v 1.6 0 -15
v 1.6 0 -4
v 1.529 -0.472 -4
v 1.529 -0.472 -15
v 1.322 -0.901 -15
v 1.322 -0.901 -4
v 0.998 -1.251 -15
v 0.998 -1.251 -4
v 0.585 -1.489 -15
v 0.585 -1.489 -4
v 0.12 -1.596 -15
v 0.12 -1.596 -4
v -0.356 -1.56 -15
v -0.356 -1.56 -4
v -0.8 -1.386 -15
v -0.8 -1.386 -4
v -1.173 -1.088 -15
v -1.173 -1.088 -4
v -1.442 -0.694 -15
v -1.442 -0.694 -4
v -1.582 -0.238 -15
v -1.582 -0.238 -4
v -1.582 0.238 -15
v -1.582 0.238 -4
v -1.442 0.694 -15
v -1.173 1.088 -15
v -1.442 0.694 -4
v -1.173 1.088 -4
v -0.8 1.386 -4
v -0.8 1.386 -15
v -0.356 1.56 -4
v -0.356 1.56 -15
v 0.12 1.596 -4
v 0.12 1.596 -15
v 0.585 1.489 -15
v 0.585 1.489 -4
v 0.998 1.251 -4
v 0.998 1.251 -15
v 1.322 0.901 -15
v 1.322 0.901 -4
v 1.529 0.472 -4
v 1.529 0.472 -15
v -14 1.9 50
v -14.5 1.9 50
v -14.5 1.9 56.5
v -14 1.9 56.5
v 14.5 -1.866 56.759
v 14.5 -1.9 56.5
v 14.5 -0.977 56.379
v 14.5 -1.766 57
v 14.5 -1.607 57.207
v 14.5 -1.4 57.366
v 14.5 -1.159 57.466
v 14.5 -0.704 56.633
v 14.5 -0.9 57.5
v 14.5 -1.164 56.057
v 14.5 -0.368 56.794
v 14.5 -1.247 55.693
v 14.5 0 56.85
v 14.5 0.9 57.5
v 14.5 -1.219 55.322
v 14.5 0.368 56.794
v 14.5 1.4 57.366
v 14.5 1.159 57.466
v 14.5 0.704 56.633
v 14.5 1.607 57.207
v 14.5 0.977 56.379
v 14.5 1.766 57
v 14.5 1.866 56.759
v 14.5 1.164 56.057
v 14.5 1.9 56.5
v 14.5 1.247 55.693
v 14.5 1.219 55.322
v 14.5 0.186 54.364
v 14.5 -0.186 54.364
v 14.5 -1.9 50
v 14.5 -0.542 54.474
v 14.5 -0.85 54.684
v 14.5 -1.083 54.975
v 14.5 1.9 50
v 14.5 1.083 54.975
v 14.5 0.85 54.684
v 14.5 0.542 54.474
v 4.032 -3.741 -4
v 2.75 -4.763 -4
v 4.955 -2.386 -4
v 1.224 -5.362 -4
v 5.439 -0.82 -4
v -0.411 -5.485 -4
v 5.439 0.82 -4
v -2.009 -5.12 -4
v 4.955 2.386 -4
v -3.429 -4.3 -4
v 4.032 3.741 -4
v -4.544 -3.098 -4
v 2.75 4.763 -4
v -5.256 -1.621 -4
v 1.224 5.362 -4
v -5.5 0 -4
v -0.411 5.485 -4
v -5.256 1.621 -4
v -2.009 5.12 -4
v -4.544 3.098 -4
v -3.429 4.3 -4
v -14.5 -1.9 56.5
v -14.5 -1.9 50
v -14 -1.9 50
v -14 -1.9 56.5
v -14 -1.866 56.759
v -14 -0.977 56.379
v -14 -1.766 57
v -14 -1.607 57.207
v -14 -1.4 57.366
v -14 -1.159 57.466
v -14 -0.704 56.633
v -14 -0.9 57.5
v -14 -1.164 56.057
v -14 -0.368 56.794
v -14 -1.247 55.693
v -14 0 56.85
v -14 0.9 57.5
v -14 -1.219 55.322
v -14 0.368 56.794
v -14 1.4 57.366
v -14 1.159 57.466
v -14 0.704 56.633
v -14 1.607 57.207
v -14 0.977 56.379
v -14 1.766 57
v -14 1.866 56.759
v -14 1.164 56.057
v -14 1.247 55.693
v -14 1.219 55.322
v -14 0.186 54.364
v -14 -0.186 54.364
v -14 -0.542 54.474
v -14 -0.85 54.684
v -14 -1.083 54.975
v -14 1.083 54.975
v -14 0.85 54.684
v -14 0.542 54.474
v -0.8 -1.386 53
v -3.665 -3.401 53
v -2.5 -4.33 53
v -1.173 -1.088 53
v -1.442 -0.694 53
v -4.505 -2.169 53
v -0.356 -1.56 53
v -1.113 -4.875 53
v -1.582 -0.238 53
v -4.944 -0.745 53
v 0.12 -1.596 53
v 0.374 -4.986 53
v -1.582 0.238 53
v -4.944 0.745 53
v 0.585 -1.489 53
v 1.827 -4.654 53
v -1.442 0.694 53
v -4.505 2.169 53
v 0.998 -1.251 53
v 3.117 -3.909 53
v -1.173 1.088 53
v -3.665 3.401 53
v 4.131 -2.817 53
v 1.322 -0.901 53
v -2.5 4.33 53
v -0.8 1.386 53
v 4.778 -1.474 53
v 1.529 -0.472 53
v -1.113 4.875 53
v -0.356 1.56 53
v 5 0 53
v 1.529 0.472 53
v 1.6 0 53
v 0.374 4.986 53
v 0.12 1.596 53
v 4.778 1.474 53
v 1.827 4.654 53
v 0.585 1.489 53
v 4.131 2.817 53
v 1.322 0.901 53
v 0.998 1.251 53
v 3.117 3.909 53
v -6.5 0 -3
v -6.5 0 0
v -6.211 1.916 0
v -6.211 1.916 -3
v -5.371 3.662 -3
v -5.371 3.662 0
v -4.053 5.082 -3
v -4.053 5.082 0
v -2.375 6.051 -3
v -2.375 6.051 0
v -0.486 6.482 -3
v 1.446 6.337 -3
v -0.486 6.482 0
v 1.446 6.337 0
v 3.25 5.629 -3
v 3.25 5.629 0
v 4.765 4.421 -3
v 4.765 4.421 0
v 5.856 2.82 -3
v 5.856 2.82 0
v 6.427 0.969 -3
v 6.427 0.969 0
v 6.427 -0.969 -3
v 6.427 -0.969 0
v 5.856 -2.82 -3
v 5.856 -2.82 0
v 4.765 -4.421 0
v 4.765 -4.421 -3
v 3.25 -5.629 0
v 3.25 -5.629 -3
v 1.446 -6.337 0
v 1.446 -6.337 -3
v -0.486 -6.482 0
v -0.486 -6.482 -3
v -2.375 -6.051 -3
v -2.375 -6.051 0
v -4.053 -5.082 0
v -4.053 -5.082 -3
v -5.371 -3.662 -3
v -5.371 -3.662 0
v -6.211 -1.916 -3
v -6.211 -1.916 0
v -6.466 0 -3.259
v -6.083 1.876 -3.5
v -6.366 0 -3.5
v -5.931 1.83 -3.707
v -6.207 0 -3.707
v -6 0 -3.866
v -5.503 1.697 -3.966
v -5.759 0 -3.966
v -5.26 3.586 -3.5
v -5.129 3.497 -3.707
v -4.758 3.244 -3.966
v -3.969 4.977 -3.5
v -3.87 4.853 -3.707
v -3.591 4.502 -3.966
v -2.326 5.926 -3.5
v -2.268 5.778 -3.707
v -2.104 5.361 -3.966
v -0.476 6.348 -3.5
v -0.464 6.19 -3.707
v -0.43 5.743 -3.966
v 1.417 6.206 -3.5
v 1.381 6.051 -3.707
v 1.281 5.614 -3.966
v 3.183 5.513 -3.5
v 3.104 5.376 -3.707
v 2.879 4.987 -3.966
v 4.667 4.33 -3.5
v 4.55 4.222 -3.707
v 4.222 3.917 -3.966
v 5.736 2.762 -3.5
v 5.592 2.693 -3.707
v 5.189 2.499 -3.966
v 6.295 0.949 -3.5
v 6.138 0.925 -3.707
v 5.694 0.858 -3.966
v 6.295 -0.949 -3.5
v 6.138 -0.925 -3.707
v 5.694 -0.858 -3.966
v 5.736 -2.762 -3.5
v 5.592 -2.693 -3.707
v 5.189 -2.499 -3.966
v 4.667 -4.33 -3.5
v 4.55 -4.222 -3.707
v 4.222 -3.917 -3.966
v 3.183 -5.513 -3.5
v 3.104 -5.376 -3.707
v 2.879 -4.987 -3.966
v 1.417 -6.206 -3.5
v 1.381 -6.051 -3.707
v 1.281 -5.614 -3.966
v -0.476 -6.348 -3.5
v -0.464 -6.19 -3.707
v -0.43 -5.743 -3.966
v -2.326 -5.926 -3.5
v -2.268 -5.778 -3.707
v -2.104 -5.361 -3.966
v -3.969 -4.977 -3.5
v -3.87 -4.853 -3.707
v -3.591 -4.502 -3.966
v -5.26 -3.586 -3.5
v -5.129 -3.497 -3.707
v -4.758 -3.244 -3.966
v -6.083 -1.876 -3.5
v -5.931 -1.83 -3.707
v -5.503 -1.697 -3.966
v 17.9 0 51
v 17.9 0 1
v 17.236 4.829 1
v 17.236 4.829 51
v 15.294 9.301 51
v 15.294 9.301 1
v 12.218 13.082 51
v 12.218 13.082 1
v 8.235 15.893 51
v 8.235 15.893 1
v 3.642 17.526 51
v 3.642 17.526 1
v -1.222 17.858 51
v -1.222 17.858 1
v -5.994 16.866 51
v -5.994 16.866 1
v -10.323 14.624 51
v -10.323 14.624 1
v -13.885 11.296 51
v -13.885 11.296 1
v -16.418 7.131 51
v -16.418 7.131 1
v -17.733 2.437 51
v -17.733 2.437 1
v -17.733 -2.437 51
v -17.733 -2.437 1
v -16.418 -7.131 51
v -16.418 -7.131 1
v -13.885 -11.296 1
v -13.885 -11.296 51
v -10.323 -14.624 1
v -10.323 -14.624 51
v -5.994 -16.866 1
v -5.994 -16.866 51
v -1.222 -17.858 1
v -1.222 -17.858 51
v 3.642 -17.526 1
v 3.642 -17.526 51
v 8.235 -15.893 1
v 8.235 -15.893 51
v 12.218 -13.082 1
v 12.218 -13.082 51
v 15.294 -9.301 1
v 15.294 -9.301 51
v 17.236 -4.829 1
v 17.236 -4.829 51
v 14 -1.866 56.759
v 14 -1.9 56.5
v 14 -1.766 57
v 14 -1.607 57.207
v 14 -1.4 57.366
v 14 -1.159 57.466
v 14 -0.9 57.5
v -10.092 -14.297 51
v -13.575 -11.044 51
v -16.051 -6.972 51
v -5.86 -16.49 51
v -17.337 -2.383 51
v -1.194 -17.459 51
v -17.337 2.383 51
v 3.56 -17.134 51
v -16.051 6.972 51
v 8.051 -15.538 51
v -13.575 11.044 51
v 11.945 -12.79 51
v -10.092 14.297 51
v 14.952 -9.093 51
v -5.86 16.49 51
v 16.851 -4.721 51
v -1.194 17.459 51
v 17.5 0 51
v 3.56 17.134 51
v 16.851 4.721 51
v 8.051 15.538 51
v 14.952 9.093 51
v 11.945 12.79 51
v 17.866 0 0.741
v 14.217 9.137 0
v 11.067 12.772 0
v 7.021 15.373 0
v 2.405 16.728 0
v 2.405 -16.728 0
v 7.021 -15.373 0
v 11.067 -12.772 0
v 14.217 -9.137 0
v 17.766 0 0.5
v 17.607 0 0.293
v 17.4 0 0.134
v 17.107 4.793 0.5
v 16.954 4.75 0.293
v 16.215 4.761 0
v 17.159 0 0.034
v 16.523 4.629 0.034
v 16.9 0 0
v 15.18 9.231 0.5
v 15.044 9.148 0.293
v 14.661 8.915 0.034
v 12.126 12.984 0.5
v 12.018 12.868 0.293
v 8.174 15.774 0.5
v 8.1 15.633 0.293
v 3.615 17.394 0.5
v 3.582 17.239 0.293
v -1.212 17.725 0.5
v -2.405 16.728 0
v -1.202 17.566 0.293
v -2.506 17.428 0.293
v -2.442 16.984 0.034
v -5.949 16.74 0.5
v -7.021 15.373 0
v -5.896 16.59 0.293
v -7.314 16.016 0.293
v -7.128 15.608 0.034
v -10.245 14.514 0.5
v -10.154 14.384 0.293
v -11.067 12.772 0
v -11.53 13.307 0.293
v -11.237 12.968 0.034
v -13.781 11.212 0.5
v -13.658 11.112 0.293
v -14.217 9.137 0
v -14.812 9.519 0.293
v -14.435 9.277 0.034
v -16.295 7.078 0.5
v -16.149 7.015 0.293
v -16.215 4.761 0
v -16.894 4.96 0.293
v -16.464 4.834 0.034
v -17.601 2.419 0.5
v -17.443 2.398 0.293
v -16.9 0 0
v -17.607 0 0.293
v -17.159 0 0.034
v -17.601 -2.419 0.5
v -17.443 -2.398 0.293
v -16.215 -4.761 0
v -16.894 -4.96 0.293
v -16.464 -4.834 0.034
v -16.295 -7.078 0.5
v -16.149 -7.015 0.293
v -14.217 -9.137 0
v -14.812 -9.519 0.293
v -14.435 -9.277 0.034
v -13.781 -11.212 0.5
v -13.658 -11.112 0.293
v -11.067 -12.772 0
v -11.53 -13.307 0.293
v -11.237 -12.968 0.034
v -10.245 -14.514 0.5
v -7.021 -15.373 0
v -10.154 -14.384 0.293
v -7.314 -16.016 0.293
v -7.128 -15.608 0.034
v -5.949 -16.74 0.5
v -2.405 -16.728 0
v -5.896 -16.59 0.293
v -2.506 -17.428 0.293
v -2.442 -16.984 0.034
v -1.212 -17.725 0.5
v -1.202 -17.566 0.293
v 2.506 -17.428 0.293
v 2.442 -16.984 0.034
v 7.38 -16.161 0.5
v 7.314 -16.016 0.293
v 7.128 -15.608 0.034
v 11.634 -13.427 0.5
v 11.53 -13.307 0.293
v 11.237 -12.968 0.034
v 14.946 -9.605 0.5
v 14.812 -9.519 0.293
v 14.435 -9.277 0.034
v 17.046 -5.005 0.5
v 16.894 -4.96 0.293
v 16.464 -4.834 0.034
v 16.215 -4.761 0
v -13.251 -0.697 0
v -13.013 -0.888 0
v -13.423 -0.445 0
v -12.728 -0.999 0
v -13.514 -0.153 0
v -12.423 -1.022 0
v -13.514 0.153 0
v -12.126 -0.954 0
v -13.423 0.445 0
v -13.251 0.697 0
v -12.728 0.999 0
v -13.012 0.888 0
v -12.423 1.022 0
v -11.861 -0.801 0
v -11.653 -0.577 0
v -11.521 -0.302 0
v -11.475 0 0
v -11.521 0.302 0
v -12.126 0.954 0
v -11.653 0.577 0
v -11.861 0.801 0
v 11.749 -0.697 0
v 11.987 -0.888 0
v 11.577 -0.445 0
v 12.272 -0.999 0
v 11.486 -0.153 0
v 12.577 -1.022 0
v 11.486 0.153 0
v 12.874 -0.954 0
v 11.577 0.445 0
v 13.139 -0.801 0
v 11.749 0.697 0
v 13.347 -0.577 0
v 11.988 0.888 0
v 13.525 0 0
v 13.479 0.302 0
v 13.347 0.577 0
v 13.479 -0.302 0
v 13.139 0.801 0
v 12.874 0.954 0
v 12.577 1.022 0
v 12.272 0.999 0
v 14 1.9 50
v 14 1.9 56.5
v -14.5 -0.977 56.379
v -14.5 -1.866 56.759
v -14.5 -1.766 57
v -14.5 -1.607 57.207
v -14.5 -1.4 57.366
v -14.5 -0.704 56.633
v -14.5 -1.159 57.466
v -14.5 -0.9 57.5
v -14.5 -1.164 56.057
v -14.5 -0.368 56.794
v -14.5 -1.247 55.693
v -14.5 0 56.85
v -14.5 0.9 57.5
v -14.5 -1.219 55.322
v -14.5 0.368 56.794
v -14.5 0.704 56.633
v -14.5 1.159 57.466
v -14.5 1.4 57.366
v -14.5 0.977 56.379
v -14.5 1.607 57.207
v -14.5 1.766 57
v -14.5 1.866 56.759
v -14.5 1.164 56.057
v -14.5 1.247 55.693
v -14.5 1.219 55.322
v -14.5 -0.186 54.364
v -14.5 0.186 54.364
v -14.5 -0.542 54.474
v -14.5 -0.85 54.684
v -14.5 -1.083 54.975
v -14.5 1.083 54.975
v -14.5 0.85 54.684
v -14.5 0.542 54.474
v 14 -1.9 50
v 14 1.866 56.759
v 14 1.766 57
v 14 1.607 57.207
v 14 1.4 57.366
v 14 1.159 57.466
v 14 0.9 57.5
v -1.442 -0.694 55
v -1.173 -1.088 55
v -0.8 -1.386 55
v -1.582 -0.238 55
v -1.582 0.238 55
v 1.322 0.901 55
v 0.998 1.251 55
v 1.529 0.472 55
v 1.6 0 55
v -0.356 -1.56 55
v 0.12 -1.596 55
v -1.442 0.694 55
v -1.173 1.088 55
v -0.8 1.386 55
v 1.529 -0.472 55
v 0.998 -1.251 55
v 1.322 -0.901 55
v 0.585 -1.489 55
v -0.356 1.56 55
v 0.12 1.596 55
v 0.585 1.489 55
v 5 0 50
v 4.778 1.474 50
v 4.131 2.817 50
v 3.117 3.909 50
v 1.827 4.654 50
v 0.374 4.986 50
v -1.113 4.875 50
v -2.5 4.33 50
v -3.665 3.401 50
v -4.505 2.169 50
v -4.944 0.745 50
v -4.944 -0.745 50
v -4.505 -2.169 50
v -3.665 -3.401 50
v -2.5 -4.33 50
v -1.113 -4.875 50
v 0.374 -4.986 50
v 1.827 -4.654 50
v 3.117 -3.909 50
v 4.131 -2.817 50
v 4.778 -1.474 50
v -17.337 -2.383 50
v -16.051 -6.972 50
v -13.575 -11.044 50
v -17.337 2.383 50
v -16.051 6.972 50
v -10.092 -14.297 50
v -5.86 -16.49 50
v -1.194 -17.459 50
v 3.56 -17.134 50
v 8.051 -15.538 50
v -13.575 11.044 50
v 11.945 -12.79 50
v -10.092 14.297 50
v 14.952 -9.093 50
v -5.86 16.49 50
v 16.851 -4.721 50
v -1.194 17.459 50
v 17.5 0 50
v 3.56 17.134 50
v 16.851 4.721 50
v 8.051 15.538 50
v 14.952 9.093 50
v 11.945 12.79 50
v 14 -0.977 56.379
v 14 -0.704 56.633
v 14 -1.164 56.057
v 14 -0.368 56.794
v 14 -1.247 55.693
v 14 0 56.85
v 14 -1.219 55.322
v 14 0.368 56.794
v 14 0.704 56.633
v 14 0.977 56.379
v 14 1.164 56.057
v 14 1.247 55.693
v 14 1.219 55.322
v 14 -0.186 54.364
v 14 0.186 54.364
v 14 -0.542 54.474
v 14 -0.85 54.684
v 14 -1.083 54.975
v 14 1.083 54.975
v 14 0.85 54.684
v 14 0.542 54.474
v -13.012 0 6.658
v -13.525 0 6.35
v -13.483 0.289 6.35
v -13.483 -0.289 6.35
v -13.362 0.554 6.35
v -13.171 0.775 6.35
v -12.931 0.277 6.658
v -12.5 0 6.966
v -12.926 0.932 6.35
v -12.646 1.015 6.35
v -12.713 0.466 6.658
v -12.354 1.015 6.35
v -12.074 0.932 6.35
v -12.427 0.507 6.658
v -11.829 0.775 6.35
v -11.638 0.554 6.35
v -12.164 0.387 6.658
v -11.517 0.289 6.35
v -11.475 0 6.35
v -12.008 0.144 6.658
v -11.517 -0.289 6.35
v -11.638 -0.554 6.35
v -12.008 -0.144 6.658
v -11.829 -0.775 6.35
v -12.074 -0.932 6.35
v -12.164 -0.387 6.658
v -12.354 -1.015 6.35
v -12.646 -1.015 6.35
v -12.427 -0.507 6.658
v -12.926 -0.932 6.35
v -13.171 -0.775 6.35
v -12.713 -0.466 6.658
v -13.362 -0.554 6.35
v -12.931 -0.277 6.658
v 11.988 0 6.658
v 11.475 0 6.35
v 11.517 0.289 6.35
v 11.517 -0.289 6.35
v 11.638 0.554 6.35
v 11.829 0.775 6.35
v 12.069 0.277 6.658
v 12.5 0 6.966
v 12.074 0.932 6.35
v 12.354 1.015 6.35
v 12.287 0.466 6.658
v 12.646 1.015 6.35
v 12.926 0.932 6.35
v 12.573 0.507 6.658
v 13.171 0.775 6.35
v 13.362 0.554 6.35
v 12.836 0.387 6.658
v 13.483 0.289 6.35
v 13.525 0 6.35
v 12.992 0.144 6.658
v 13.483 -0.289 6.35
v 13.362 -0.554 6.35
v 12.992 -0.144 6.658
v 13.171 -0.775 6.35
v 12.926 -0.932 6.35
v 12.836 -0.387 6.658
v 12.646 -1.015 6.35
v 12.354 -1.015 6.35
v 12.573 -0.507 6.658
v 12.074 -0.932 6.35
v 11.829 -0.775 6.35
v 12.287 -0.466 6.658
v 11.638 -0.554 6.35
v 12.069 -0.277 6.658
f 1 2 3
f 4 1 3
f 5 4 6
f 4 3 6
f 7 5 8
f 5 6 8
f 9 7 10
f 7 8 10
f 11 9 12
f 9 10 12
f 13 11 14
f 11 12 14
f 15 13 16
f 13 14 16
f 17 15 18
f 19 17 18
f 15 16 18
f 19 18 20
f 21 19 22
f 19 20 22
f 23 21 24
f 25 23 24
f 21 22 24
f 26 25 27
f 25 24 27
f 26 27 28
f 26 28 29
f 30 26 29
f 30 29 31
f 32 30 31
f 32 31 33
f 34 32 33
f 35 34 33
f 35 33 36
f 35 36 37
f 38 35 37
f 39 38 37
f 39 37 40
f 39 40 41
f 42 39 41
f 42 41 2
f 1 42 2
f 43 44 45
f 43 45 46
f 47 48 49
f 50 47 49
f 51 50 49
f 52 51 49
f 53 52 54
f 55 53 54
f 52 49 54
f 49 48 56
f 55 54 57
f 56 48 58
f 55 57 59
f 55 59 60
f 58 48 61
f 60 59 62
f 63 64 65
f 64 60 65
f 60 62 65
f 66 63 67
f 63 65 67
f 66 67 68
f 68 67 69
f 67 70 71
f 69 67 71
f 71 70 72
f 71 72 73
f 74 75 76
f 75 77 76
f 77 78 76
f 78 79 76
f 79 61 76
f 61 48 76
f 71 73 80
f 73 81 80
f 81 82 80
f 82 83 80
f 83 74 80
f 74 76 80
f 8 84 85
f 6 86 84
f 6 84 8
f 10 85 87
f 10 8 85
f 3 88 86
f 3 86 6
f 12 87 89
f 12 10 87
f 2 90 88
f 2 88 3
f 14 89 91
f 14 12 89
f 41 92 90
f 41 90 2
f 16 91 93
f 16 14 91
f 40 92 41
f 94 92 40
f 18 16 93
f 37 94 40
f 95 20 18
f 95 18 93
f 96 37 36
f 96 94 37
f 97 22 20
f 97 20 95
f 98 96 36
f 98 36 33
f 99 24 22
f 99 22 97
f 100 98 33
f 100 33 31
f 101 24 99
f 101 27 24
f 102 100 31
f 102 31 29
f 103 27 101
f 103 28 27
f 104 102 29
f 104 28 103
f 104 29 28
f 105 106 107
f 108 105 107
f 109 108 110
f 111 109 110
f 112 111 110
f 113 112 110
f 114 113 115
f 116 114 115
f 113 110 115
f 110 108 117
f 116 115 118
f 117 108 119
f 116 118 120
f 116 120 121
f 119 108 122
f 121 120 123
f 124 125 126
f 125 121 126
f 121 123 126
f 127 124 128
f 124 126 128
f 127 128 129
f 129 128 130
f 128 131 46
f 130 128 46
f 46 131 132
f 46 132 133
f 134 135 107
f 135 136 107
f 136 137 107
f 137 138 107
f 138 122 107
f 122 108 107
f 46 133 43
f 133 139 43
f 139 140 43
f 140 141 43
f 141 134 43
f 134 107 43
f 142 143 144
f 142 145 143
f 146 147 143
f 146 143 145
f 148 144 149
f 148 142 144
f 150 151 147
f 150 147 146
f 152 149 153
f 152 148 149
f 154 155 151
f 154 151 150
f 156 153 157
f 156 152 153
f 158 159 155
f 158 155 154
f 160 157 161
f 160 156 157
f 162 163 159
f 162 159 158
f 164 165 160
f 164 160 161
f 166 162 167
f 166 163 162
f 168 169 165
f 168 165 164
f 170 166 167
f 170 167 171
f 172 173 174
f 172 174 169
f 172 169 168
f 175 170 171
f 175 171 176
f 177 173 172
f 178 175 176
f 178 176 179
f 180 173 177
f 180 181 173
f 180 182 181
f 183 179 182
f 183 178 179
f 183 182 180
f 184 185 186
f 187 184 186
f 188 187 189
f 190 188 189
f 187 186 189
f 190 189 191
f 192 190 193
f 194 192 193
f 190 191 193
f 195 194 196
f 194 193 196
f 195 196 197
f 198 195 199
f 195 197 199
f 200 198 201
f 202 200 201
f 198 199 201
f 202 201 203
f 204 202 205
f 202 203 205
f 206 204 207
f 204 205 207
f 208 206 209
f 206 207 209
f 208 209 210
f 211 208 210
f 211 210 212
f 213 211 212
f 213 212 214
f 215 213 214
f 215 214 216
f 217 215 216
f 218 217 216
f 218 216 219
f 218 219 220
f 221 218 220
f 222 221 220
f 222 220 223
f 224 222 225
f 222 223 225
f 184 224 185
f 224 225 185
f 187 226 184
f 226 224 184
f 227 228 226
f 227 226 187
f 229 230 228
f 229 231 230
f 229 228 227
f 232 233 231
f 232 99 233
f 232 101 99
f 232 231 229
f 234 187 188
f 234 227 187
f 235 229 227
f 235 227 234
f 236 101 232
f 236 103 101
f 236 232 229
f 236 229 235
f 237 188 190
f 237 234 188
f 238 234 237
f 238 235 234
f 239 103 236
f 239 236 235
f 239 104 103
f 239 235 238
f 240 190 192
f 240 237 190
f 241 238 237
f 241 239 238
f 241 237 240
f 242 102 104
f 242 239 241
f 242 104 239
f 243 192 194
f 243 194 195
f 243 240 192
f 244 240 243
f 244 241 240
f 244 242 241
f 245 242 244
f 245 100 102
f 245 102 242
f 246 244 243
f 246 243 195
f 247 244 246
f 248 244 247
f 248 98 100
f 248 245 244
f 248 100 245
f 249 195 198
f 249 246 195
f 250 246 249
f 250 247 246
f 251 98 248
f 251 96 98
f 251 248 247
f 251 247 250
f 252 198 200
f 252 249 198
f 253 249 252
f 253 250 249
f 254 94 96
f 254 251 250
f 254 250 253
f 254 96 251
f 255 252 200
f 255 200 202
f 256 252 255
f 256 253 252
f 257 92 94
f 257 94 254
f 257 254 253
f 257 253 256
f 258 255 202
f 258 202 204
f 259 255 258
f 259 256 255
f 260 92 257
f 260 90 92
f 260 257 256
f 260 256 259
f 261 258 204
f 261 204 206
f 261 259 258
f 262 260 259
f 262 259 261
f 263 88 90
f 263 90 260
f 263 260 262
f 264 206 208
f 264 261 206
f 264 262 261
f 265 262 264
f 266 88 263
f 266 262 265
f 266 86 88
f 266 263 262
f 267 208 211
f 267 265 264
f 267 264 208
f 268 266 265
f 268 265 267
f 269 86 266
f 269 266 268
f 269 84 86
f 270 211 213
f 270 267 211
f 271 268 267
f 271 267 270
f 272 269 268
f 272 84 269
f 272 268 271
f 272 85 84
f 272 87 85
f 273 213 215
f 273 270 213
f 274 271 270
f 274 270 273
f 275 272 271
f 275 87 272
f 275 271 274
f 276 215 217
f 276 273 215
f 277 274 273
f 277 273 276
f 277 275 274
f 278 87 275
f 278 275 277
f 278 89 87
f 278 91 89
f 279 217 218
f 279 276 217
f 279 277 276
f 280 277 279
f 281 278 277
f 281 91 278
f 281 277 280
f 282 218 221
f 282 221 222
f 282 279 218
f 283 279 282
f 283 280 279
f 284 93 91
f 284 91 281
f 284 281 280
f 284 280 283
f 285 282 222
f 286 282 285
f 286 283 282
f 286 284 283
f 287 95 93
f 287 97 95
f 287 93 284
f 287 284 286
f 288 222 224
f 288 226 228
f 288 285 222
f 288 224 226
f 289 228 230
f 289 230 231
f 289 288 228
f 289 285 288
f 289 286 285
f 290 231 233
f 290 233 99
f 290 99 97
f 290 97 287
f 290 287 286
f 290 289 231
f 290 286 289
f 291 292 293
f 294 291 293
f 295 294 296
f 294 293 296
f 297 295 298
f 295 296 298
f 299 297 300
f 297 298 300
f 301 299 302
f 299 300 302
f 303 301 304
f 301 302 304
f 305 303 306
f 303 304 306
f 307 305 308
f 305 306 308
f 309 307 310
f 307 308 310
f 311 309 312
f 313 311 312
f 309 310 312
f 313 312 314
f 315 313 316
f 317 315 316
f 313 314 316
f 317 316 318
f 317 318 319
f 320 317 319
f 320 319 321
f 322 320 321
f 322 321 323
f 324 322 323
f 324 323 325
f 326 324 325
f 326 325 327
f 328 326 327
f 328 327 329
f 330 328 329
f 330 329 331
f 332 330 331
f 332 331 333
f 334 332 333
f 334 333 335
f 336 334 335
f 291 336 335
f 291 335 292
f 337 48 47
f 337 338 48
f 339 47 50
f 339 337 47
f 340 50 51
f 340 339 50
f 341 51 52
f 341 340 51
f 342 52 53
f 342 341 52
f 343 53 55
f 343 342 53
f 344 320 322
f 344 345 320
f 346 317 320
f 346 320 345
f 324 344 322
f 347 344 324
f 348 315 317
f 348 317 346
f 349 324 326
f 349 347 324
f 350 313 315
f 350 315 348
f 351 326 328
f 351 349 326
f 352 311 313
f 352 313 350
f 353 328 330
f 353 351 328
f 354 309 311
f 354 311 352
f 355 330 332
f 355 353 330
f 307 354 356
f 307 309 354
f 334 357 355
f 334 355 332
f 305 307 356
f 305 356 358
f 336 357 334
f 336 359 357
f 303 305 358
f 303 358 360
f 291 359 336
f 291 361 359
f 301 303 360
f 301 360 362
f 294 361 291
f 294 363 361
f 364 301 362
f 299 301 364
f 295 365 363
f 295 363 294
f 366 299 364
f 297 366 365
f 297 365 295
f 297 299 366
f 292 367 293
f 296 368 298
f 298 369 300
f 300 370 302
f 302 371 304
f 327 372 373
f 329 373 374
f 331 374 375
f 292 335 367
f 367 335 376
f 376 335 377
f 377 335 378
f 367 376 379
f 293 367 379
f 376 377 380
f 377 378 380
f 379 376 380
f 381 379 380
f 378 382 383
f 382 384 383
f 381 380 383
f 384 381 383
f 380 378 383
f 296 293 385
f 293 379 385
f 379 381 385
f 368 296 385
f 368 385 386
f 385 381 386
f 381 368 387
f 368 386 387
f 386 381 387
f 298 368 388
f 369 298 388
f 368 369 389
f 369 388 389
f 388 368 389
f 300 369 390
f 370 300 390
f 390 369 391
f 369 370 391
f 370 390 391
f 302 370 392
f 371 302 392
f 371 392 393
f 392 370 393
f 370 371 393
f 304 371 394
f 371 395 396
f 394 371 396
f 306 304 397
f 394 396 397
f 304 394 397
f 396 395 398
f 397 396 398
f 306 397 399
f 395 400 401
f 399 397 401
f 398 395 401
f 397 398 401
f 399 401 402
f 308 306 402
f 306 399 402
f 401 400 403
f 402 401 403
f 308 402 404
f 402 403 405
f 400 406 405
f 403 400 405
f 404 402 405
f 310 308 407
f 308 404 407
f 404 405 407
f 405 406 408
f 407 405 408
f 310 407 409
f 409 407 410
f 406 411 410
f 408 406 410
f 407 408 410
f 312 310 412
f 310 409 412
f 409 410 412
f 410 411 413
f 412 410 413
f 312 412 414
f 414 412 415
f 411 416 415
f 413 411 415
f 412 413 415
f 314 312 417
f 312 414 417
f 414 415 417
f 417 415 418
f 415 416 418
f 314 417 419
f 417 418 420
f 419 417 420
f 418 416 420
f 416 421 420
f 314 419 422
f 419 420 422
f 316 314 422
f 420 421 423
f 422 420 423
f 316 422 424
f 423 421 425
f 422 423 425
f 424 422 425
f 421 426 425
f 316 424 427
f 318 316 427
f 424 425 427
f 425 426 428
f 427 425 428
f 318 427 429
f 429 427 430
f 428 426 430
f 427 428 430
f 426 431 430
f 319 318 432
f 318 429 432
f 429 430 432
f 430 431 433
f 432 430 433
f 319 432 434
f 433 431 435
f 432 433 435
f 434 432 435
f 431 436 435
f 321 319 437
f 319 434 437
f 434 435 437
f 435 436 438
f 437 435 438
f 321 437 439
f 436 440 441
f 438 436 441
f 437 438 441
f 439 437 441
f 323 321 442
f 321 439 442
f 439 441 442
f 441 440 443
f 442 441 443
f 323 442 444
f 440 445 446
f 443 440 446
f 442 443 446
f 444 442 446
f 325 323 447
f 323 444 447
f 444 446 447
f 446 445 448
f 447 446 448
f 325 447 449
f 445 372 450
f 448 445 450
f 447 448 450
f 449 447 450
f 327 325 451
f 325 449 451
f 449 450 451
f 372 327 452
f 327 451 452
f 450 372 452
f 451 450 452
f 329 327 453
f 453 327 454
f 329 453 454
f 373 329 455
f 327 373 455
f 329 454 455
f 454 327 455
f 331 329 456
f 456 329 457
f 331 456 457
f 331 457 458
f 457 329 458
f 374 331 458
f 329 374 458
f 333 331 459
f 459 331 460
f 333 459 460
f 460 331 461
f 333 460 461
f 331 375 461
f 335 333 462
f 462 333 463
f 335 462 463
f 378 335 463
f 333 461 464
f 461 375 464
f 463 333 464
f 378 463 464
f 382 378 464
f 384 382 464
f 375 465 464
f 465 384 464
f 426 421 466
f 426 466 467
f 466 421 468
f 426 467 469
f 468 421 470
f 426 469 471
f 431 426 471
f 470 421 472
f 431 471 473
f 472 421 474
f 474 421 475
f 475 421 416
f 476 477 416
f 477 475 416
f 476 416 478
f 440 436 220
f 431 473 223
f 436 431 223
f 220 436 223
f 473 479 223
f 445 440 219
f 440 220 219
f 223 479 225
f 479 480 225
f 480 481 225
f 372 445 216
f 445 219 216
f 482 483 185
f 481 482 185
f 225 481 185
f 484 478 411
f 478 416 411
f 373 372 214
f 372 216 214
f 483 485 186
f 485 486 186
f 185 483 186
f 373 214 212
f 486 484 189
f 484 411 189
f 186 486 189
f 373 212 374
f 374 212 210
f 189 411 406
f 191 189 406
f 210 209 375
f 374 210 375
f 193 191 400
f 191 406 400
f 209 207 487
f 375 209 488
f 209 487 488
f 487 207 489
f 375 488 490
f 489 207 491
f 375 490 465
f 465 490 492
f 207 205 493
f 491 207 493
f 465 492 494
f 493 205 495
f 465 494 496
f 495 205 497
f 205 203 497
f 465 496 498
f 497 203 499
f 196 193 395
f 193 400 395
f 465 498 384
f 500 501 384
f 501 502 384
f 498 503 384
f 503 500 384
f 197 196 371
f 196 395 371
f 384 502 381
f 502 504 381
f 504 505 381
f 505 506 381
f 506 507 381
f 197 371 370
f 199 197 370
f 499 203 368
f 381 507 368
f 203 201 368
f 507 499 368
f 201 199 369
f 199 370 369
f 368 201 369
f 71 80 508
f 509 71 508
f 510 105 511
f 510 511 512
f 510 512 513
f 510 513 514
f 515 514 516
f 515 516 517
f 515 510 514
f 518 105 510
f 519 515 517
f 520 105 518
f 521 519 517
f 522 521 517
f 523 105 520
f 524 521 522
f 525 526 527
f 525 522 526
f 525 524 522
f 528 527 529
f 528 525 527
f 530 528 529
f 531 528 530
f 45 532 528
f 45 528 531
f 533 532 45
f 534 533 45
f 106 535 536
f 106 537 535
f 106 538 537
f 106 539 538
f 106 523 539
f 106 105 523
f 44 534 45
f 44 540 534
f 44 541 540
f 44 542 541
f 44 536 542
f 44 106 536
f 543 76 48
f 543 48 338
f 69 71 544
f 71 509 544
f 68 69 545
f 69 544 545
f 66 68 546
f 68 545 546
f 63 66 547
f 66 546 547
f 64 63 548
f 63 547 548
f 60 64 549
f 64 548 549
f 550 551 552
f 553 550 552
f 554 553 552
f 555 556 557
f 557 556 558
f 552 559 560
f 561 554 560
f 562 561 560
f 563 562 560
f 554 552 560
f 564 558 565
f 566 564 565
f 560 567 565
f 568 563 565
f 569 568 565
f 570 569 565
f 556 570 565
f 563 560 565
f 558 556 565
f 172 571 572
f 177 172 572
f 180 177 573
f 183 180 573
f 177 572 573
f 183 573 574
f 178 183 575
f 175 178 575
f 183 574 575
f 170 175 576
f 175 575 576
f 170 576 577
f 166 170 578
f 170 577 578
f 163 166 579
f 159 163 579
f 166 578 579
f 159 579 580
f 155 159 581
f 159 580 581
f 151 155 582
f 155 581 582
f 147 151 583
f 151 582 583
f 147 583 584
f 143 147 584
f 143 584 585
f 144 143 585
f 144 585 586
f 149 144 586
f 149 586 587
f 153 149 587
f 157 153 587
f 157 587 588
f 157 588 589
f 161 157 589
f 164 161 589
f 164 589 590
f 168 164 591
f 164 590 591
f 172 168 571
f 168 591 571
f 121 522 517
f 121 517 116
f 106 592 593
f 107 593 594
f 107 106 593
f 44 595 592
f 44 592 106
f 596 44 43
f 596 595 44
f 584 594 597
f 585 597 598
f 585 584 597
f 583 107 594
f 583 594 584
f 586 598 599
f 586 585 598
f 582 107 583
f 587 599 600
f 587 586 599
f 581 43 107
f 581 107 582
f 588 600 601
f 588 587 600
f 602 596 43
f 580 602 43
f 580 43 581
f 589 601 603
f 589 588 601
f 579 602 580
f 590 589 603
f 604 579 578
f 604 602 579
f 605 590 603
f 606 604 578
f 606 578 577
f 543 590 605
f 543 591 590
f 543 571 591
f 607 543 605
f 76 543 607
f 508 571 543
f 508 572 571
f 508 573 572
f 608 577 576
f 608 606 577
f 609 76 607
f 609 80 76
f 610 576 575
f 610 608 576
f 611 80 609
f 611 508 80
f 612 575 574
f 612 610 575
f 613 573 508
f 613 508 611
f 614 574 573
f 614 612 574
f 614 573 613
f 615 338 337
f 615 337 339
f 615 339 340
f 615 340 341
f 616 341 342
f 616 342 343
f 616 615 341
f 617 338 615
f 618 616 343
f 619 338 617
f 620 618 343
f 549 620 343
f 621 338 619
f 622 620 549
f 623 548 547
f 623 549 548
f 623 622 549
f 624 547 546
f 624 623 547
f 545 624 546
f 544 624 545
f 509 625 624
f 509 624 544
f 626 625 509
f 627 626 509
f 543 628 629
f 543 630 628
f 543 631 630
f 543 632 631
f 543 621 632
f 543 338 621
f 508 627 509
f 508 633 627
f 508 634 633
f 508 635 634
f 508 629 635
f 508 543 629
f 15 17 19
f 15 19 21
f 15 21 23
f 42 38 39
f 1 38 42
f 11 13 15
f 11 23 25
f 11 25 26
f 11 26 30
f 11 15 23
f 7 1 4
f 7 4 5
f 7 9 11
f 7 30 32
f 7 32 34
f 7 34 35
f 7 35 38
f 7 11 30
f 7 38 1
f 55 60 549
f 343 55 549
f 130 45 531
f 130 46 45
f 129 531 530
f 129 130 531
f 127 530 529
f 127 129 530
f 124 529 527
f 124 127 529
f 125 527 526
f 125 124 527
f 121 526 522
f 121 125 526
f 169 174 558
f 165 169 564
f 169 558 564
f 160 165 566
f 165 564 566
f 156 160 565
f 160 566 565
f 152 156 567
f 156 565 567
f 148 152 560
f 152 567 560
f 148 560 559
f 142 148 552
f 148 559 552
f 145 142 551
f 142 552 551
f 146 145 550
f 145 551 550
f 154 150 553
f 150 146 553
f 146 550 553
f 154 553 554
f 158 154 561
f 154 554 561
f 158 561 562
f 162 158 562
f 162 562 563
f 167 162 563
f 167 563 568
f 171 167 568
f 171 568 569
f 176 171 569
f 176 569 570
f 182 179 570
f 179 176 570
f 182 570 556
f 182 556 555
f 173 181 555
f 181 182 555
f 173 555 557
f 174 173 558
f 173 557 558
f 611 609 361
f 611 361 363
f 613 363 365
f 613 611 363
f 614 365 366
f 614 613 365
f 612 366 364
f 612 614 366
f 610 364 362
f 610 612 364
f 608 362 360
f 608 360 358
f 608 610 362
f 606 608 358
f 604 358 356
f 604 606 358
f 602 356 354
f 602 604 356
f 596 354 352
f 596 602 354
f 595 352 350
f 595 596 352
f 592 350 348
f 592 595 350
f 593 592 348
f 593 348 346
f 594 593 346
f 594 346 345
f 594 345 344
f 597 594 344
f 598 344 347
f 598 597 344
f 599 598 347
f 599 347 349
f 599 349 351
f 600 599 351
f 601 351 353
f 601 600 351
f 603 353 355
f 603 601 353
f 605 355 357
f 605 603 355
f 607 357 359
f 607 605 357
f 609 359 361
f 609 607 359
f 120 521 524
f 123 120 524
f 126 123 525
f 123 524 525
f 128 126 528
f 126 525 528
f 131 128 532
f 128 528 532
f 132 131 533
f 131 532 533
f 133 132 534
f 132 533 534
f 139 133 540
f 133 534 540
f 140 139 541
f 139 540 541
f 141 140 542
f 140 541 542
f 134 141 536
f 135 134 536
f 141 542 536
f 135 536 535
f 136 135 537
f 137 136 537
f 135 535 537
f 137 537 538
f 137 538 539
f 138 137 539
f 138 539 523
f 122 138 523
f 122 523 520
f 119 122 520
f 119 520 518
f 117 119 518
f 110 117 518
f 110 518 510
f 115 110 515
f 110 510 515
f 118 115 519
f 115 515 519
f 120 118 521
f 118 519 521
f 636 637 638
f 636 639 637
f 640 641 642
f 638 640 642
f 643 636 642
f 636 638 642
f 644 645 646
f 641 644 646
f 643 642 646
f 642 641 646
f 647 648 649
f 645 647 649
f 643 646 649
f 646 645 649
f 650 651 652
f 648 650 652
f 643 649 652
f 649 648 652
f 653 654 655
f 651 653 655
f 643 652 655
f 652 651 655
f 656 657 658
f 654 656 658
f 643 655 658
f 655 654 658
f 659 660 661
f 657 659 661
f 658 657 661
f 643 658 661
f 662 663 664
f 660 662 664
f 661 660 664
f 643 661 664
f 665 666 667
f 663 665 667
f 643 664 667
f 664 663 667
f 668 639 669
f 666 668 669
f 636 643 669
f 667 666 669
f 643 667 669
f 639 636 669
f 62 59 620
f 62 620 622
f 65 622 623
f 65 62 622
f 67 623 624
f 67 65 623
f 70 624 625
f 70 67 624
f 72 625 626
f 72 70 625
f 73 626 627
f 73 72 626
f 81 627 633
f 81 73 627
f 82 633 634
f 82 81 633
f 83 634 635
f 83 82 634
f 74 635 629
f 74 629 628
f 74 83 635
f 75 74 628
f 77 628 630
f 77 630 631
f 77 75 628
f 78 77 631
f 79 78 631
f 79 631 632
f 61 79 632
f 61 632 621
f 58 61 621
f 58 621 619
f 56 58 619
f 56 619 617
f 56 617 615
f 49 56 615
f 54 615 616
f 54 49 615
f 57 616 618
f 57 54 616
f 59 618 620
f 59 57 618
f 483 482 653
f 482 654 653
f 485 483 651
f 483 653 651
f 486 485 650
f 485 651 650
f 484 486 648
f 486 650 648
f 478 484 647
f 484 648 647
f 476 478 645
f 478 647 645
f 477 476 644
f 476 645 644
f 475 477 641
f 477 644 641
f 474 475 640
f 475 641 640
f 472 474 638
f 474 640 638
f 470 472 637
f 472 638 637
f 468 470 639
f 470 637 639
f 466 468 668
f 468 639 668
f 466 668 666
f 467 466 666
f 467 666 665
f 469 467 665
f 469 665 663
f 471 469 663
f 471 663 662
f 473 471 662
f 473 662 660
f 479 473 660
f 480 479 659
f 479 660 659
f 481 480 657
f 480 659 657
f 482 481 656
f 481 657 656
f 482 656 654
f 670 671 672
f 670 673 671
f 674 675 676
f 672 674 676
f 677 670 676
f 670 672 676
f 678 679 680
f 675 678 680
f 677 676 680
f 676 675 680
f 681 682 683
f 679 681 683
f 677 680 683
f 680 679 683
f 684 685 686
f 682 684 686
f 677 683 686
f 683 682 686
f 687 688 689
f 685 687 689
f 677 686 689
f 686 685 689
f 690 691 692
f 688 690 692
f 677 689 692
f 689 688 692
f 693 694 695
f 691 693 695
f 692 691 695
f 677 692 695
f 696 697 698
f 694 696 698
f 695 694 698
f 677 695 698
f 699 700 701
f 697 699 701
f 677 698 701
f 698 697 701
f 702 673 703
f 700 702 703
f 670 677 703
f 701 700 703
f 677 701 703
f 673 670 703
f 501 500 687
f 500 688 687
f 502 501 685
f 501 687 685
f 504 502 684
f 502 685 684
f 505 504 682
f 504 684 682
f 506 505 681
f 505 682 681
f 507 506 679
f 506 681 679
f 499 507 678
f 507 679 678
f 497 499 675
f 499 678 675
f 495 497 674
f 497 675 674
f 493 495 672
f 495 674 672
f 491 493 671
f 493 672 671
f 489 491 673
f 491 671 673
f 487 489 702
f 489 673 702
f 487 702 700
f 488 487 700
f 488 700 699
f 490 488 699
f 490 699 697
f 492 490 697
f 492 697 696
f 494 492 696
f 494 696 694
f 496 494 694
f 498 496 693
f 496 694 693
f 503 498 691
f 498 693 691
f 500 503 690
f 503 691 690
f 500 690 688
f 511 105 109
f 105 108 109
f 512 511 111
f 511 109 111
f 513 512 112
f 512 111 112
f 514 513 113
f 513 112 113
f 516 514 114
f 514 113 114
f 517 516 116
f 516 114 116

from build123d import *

# Parameters (mm, degrees)
SKETCH1_R                    = 17.9
BOSS_EXTRUDE1_DEPTH          = 50
SKETCH2_R                    = 6.5
BOSS_EXTRUDE2_DEPTH          = 4
SKETCH4_R                    = 5
BOSS_EXTRUDE3_DEPTH          = 3
BOSS_EXTRUDE4_DEPTH          = 11
BOSS_EXTRUDE4_DEPTH_BACK     = 59
SKETCH3_R                    = 1.6
SKETCH5_R                    = 17.9
SKETCH5_R_2                  = 17.5
BOSS_EXTRUDE5_DEPTH          = 1
SKETCH6_W                    = 0.5
SKETCH6_H                    = 3.8
BOSS_EXTRUDE6_DEPTH          = 7.5
SKETCH7_R                    = 1.25
CUT_EXTRUDE1_DEPTH           = 0.5
FILLET1_R                    = 1
FILLET1_OF_MIRROR3_R         = 1
FILLET2_R                    = 1
FILLET3_R                    = 1
M2_5X0_45_TAPPED_HOLE1_D     = 2.05
M2_5X0_45_TAPPED_HOLE1_DEPTH = 6.35
M2_5X0_45_TAPPED_HOLE1_TIP   = 0.615882135


with BuildPart() as part:
    # Sketch1 → Boss-Extrude1 (new body)
    with BuildSketch(Plane.XY):
        Circle(SKETCH1_R)
    extrude(amount=BOSS_EXTRUDE1_DEPTH)

    # Sketch2 → Boss-Extrude2 (add)
    with BuildSketch(Plane(origin=(0, 0, 0), x_dir=(-1, 0, 0), z_dir=(0, 0, -1))):
        Circle(SKETCH2_R)
    extrude(amount=BOSS_EXTRUDE2_DEPTH)

    # Sketch4 → Boss-Extrude3 (add)
    with BuildSketch(Plane.XY.offset(50)):
        Circle(SKETCH4_R)
    extrude(amount=BOSS_EXTRUDE3_DEPTH)

    # Sketch3 → Boss-Extrude4 (add, two sides: drawn at the far end of the back side and taken through both)
    with BuildSketch(Plane(origin=(0, 0, -4), x_dir=(-1, 0, 0), z_dir=(0, 0, -1)).offset(-BOSS_EXTRUDE4_DEPTH_BACK)):
        with Locations(Location((0, 0, 0), (0, 0, 180))):
            Circle(SKETCH3_R)
    extrude(amount=BOSS_EXTRUDE4_DEPTH + BOSS_EXTRUDE4_DEPTH_BACK)

    # Sketch5 → Boss-Extrude5 (add)
    with BuildSketch(Plane.XY.offset(50)):
        Circle(SKETCH5_R)
        Circle(SKETCH5_R_2, mode=Mode.SUBTRACT)
    extrude(amount=BOSS_EXTRUDE5_DEPTH)

    # Sketch6 → Boss-Extrude6 (add)
    with BuildSketch(Plane.XY.offset(50)):
        with Locations((-14.25, 0)):
            Rectangle(SKETCH6_W, SKETCH6_H)
    boss_extrude6 = extrude(amount=BOSS_EXTRUDE6_DEPTH)

    # Sketch7 → Cut-Extrude1 (cut)
    with BuildSketch(Plane.ZY.offset(14.5)):
        with Locations((55.6, 0)):
            Circle(SKETCH7_R)
    cut_extrude1 = extrude(amount=-CUT_EXTRUDE1_DEPTH, mode=Mode.SUBTRACT)

    # Fillet1
    fillet1_edges = [part.edges().sort_by_distance(p)[0] for p in [
        (-14.25, 1.9, 57.5),
        (-14.25, -1.9, 57.5),
    ]]
    fillet(fillet1_edges, radius=FILLET1_R)

    # Mirror3: Boss-Extrude6, Cut-Extrude1 across plane
    add(boss_extrude6.mirror(Plane(origin=(0, 0, 0), x_dir=(0, 0, 1), z_dir=(1, 0, 0))))
    add(cut_extrude1.mirror(Plane(origin=(0, 0, 0), x_dir=(0, 0, 1), z_dir=(1, 0, 0))), mode=Mode.SUBTRACT)

    # Fillet1 of Mirror3
    fillet1_of_mirror3_edges = [part.edges().sort_by_distance(p)[0] for p in [
        (14.25, 1.9, 57.5),
        (14.25, -1.9, 57.5),
    ]]
    fillet(fillet1_of_mirror3_edges, radius=FILLET1_OF_MIRROR3_R)

    # Fillet2
    fillet2_edges = [part.edges().sort_by_distance(p)[0] for p in [
        (-17.9, 0, 0),
    ]]
    fillet(fillet2_edges, radius=FILLET2_R)

    # Fillet3
    fillet3_edges = [part.edges().sort_by_distance(p)[0] for p in [
        (6.5, 0, -4),
    ]]
    fillet(fillet3_edges, radius=FILLET3_R)

    # M2.5x0.45 Tapped Hole1
    with Locations(Plane(origin=(0, 0, 0), x_dir=(-1, 0, 0), z_dir=(0, 0, -1))):
        with Locations((-12.5, 0), (12.5, 0)):
            Hole(M2_5X0_45_TAPPED_HOLE1_D / 2, depth=M2_5X0_45_TAPPED_HOLE1_DEPTH)
            with Locations((0, 0, -(M2_5X0_45_TAPPED_HOLE1_DEPTH + M2_5X0_45_TAPPED_HOLE1_TIP / 2))):  # 118° drill point
                Cone(0, M2_5X0_45_TAPPED_HOLE1_D / 2, M2_5X0_45_TAPPED_HOLE1_TIP, mode=Mode.SUBTRACT)


solid = part.part
